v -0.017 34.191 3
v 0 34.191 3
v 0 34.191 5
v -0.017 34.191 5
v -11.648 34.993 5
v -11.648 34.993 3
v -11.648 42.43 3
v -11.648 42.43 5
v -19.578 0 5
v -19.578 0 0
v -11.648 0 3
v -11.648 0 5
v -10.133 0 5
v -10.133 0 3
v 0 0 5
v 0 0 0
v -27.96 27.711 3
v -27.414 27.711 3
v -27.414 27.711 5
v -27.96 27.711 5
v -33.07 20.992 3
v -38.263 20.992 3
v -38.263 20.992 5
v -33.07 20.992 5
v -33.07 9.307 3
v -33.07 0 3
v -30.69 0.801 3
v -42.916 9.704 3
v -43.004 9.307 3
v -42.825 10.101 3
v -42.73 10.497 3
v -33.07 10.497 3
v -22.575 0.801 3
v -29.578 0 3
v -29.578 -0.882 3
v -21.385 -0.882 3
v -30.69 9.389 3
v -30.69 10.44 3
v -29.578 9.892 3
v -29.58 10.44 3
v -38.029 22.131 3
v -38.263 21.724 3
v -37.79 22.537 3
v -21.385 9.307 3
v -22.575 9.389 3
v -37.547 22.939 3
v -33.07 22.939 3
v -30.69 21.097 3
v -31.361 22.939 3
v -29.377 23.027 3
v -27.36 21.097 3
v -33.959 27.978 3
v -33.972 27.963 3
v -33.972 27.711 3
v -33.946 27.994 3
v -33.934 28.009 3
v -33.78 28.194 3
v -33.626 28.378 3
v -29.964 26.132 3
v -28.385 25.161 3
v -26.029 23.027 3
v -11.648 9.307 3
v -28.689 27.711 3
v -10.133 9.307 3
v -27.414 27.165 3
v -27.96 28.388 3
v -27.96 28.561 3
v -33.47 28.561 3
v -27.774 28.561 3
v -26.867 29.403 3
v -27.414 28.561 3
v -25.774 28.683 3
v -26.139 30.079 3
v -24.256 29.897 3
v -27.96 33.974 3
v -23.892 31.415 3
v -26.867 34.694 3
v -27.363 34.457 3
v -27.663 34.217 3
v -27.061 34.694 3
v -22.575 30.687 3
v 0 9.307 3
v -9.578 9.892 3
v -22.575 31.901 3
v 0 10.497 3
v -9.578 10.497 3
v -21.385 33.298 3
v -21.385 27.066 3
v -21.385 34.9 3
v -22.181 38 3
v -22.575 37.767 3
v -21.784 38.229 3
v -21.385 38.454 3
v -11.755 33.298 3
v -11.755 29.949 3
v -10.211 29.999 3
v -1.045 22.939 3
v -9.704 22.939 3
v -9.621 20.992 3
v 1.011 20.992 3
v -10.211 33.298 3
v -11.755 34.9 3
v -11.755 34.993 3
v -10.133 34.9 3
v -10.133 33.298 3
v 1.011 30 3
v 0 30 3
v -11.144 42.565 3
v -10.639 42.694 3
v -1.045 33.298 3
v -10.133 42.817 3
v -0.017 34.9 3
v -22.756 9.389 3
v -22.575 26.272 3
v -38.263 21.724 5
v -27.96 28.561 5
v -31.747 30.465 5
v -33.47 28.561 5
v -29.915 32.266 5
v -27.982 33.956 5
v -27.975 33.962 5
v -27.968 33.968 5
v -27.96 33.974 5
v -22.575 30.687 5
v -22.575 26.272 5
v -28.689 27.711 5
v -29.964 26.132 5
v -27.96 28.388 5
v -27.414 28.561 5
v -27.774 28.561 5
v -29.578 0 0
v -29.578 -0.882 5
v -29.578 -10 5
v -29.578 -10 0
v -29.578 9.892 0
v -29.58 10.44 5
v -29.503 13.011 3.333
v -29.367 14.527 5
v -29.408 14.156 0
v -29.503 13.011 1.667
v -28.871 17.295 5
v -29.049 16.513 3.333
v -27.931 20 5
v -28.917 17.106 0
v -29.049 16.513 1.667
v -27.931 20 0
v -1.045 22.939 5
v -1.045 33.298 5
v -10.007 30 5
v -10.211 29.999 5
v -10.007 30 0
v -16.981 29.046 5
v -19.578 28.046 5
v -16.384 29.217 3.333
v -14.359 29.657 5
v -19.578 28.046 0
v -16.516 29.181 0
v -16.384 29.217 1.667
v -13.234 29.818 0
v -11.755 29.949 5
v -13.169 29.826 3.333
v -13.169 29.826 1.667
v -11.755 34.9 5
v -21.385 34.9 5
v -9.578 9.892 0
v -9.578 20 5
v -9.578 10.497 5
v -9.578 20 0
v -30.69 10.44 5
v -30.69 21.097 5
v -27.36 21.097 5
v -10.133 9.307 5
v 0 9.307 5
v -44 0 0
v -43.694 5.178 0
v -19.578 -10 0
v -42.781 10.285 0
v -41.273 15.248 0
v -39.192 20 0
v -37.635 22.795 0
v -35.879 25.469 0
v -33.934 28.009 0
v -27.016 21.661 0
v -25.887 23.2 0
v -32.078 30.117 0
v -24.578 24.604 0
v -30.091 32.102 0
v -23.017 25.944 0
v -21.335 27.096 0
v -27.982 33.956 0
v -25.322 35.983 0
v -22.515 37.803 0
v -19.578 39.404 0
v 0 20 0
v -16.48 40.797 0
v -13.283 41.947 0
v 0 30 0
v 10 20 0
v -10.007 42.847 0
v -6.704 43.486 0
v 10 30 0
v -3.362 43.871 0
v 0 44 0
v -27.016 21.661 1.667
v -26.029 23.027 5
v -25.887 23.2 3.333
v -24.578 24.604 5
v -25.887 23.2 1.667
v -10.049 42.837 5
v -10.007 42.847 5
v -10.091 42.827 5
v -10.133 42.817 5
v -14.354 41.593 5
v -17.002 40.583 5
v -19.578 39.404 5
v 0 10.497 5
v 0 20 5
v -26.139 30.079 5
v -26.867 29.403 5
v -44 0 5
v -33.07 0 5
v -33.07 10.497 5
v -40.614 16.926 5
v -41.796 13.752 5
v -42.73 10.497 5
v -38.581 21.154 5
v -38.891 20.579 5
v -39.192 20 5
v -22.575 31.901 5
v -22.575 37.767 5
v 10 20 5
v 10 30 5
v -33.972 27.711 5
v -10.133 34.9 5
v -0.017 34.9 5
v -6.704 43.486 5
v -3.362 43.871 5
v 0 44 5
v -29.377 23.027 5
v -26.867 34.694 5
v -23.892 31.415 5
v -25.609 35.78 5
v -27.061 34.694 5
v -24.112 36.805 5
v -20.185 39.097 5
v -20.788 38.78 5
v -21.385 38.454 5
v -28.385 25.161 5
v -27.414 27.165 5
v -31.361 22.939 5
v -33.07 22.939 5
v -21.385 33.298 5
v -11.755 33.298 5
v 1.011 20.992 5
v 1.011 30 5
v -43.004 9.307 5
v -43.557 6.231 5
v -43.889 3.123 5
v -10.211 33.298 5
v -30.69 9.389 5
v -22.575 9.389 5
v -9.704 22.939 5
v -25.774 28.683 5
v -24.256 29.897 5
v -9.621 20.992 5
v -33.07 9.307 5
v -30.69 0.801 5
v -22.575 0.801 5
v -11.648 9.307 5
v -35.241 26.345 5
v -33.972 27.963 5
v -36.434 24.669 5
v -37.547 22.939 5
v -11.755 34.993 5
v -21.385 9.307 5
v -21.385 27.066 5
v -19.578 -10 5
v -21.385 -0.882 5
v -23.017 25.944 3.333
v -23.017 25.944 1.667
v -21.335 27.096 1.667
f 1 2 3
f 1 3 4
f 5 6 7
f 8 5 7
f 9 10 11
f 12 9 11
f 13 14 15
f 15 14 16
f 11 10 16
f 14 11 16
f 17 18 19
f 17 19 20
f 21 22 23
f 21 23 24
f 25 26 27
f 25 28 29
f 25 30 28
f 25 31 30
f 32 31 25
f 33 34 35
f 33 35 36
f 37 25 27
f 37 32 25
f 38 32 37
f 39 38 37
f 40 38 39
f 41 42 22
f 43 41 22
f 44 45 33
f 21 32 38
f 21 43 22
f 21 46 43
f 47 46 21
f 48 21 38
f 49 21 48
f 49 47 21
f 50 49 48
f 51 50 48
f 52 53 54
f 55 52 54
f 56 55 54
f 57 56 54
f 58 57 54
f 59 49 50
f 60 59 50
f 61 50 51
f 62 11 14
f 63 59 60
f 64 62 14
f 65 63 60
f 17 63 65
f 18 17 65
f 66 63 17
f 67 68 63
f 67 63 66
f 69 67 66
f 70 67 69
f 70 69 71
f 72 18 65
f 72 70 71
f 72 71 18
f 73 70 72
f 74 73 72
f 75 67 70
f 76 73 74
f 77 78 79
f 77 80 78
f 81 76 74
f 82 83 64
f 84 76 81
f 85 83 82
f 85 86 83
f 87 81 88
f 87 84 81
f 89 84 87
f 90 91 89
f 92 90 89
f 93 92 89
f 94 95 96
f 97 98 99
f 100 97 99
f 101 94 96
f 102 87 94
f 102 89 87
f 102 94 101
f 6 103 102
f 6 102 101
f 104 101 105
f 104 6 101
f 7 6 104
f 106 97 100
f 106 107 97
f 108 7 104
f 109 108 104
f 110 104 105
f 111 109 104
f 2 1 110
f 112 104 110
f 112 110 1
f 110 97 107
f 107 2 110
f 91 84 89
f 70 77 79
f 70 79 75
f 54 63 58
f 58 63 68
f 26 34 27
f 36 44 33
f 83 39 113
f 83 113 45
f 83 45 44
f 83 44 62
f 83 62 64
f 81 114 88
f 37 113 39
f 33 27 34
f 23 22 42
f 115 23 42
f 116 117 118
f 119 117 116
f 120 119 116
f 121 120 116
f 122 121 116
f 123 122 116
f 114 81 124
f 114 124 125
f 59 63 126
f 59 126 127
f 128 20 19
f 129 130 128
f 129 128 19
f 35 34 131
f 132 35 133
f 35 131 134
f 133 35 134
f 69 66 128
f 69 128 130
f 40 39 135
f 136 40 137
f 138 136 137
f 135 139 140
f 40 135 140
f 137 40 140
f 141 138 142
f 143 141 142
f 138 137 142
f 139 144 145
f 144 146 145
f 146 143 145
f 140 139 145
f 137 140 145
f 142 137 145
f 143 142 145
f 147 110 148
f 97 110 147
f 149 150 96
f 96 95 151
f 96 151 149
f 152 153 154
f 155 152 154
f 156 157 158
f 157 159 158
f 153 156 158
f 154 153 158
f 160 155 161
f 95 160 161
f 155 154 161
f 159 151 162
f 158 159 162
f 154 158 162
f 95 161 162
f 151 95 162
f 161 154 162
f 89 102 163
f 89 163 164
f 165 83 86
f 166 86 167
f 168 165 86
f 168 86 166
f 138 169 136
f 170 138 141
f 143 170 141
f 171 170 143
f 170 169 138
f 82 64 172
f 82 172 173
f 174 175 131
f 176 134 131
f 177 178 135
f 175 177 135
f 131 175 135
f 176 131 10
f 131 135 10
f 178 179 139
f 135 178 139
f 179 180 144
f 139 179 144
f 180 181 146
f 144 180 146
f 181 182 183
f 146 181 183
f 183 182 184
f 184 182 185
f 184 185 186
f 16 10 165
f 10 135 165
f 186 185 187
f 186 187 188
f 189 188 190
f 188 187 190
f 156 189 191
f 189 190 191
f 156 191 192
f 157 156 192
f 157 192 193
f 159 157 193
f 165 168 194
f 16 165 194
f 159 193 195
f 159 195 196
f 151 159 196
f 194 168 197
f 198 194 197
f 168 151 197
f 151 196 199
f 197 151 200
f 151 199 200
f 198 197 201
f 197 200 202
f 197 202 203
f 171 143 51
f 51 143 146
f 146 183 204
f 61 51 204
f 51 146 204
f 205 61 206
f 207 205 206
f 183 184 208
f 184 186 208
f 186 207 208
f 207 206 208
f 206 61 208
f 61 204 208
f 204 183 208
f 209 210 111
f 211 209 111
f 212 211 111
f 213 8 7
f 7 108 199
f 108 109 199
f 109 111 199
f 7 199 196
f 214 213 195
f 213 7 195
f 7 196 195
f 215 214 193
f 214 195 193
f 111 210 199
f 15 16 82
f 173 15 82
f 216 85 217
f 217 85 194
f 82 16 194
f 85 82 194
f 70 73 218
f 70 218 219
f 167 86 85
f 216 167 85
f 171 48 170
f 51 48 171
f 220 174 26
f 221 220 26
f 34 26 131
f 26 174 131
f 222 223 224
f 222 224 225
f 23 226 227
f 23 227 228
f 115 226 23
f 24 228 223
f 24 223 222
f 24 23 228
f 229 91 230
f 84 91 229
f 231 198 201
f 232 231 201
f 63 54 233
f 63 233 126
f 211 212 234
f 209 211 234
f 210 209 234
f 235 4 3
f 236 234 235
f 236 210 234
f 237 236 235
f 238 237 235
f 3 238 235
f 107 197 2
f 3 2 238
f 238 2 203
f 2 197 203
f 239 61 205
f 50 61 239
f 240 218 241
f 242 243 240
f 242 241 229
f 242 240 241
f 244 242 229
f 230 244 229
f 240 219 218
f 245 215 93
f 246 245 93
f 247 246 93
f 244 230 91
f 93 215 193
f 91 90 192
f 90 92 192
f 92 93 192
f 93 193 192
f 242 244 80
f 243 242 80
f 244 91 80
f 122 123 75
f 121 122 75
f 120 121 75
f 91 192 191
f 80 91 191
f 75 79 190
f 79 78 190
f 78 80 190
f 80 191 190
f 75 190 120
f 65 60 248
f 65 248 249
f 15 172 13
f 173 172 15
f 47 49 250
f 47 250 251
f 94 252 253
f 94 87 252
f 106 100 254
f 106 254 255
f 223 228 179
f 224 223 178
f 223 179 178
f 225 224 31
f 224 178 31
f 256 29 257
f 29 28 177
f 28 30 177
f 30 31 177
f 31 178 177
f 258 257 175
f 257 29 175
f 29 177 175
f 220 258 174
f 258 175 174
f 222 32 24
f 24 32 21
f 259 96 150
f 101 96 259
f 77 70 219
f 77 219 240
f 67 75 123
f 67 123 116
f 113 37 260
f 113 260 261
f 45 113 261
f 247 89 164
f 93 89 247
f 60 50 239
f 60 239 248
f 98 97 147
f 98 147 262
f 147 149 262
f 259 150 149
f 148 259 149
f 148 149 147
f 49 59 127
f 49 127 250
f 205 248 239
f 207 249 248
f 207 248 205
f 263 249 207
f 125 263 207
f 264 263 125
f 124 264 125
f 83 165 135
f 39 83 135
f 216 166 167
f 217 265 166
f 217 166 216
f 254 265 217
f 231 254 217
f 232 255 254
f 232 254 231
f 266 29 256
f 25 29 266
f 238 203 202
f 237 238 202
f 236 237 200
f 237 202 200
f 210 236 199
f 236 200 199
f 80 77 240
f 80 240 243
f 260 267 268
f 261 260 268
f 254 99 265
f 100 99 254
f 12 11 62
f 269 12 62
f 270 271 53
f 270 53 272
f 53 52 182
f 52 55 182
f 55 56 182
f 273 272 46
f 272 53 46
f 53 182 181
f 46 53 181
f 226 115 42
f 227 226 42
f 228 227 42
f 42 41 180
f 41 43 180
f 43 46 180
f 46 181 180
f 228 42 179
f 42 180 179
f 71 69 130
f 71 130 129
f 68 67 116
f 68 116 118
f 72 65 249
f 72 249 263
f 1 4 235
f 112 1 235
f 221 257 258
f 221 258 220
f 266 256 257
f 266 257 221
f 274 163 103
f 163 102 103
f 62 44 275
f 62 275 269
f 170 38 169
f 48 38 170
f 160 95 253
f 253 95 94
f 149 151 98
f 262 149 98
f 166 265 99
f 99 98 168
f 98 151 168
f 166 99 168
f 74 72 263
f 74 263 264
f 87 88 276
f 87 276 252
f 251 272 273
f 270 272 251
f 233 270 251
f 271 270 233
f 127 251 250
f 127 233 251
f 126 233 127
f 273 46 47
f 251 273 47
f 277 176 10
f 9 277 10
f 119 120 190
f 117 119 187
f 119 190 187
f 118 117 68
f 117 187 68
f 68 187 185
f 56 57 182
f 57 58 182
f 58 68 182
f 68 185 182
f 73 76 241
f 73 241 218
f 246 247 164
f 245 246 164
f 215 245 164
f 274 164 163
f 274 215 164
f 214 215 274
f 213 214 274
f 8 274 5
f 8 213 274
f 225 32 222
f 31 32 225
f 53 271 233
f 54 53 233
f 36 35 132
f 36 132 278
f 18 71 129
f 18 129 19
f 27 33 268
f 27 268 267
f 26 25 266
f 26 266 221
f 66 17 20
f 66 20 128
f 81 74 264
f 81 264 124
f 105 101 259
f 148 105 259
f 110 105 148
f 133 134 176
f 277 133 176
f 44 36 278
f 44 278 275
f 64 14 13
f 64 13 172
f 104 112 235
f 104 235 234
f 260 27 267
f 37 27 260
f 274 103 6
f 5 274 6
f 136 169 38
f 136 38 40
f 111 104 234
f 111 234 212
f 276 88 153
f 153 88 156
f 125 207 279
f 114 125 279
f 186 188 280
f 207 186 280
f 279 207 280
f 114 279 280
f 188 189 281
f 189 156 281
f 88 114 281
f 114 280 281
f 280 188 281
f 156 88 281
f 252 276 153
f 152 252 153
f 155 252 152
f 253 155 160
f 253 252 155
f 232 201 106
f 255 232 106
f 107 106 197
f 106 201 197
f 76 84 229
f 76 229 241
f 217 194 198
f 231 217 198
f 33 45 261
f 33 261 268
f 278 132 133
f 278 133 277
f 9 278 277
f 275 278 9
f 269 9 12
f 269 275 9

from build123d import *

# Parameters (mm, degrees)
F1_W     = 9.5782261753
F1_H     = 9.891791337
F1_H_2   = 10.108208663
F1_W_2   = 10
F1_H_3   = 10
F2_DEPTH = 5
F3_W     = 10.1701691747
F3_H     = 1.1901259422
F3_W_2   = 2.3802500218
F3_W_3   = 1.1901250109
F3_H_2   = 0.8006438729
F3_H_3   = 10.4947462678
F3_W_4   = 5.1932781935
F3_H_4   = 1.9474774599
F3_W_5   = 1.1901259422
F3_H_5   = 8.5062488797
F3_W_6   = 9.7373928875
F3_W_7   = 1.514704898
F3_H_6   = 9.3068927526
F3_W_8   = 10.1330708712
F3_H_7   = 1.6025230289
F3_W_9   = 9.0882331133
F3_H_8   = 3.835350275
F3_W_10  = 1.0448377579
F3_H_9   = 8.595854044
F3_W_11  = 1.0108357528
F3_W_12  = 1.0278367554
F3_H_10  = 0.8937604725
F4_DEPTH = 25
F5_W     = 8.1058442593
F5_H     = 1.9299630076
F5_W_2   = 1.5439689159
F5_W_3   = 1.5439717099
F5_H_2   = 11.9657684118
F5_W_4   = 10.3005599231
F5_H_3   = 1.0513318703
F6_DEPTH = 25


# Not quite as in the source:
# - a feature names something its author has since deleted; it is built from what else it names


with BuildPart() as f2:
    # F1 (on Top) → F2 (new body)
    with BuildSketch(Plane.XY):
        with Locations((-4.7891130877, 4.9458956685)):
            Rectangle(F1_W, F1_H)
        Polygon((-10, 0), (-9.5782261753, 0), (-9.5782261753, 9.891791337), (-19.5782261753, 9.891791337), (-19.5782261753, 0), align=None)
        with Locations((-4.7891130877, 14.9458956685)):
            Rectangle(F1_W, F1_H_2)
        Polygon((0, 30), (0, 20), (0.4217738247, 20), (10, 20), (10, 30), align=None)
        Polygon((-9.5782261753, 20), (0, 20), (0, 30), (-10.0065707871, 30), align=None)
        with Locations((-24.5782261753, 4.9458956685)):
            Rectangle(F1_W_2, F1_H)
        with Locations((-24.5782261753, -5)):
            Rectangle(F1_W_2, F1_H_3)
        with BuildLine():
            Line((-10.0065707871, 30), (0, 30))
            Line((0, 30), (0, 44))
            ThreePointArc((0, 44), (-5.0363871882, 43.7108087787), (-10.0065707871, 42.8470365496))
            Line((-10.0065707871, 42.8470365496), (-10.0065707871, 30))
        make_face()
        with BuildLine():
            Line((-44, 0), (-29.5782261753, 0))
            Line((-29.5782261753, 0), (-29.5782261753, 9.891791337))
            add(Edge.make_bspline(
                [(-29.5782261753, 9.891791337), (-29.5956822452, 12.6865898133), (-29.4779762378, 16.6539770733), (-27.9306023487, 20)],
                knots=[0, 0, 0, 0, 0.3288616787, 0.3288616787, 0.3288616787, 0.3288616787], degree=3))
            Line((-27.9306023487, 20), (-39.1918358845, 20))
            ThreePointArc((-39.1918358845, 20), (-42.7810751321, 10.2849215136), (-44, 0))
        make_face()
        with BuildLine():
            add(Edge.make_bspline(
                [(-19.5782261753, 28.0459611928), (-16.4208018887, 29.540455447), (-13.1162348053, 30), (-10.0065707871, 30)],
                knots=[0.678814496, 0.678814496, 0.678814496, 0.678814496, 1, 1, 1, 1], degree=3))
            Line((-10.0065707871, 30), (-10.0065707871, 42.8470365496))
            ThreePointArc((-10.0065707871, 42.8470365496), (-14.8922224071, 41.4031606496), (-19.5782261753, 39.4042264209))
            Line((-19.5782261753, 39.4042264209), (-19.5782261753, 28.0459611928))
        make_face()
        with BuildLine():
            add(Edge.make_bspline(
                [(-24.5782261753, 24.6040217078), (-23.0917294817, 26.0318138691), (-21.358363516, 27.2033740757), (-19.5782261753, 28.0459611928)],
                knots=[0.497731988, 0.497731988, 0.497731988, 0.497731988, 0.678814496, 0.678814496, 0.678814496, 0.678814496], degree=3))
            Line((-19.5782261753, 28.0459611928), (-19.5782261753, 39.4042264209))
            ThreePointArc((-19.5782261753, 39.4042264209), (-23.9356591488, 36.9199704918), (-27.9820429197, 33.9559313529))
            Line((-27.9820429197, 33.9559313529), (-24.5782261753, 24.6040217078))
        make_face()
        with BuildLine():
            Line((-39.1918358845, 20), (-27.9306023487, 20))
            add(Edge.make_bspline(
                [(-27.9306023487, 20), (-27.136026622, 21.7181811177), (-25.9644735778, 23.2725198056), (-24.5782261753, 24.6040217078)],
                knots=[0.3288616787, 0.3288616787, 0.3288616787, 0.3288616787, 0.497731988, 0.497731988, 0.497731988, 0.497731988], degree=3))
            Line((-24.5782261753, 24.6040217078), (-33.9336129947, 28.00910404))
            ThreePointArc((-33.9336129947, 28.00910404), (-36.7813710365, 24.148100229), (-39.1918358845, 20))
        make_face()
        with BuildLine():
            Line((-33.9336129947, 28.00910404), (-24.5782261753, 24.6040217078))
            Line((-24.5782261753, 24.6040217078), (-27.9820429197, 33.9559313529))
            ThreePointArc((-27.9820429197, 33.9559313529), (-31.1002942205, 31.1250975806), (-33.9336129947, 28.00910404))
        make_face()
    extrude(amount=F2_DEPTH)

    # F3 (on offset) → F4 (cut)
    with BuildSketch(Plane.XY.offset(3)):
        Polygon((-33.0700390041, 9.3068927526), (-33.0700390041, 0), (-31.8799139932, 0), (-31.8799139932, 0.8006438729), (-30.6897889823, 0.8006438729), (-30.6897889823, 9.3068927526), align=None)
        with Locations((-38.1551235914, 9.9019557238)):
            Rectangle(F3_W, F3_H)
        with Locations((-31.8799139932, 9.9019557238)):
            Rectangle(F3_W_2, F3_H)
        with Locations((-31.2848514877, 0.4003219365)):
            Rectangle(F3_W_3, F3_H_2)
        Polygon((-30.6897889823, 0), (-31.8799139932, 0), (-31.8799139932, -0.8824482211), (-21.3851686567, -0.8824482211), (-21.3851686567, 0), (-22.5752945989, 0), (-22.5752945989, 0.8006438729), (-30.6897889823, 0.8006438729), align=None)
        with Locations((-31.8799139932, 15.7443918288)):
            Rectangle(F3_W_2, F3_H_3)
        with Locations((-35.6666781008, 21.9655036926)):
            Rectangle(F3_W_4, F3_H_4)
        Polygon((-33.0700390041, 22.9392424226), (-33.0700390041, 20.9917649627), (-30.6897889823, 20.9917649627), (-30.6897889823, 22.9392424226), (-31.3607603312, 22.9392424226), align=None)
        with Locations((-21.9802316278, 5.0537683128)):
            Rectangle(F3_W_5, F3_H_5)
        with Locations((-21.9802316278, 9.9019557238)):
            Rectangle(F3_W_5, F3_H)
        with Locations((-21.9802316278, 0.4003219365)):
            Rectangle(F3_W_5, F3_H_2)
        with Locations((-16.516472213, 9.9019557238)):
            Rectangle(F3_W_6, F3_H)
        Polygon((-29.9641676247, 26.1324569583), (-31.3607603312, 22.9392424226), (-30.6897889823, 22.9392424226), (-29.4176749885, 22.9392424226), (-28.3854100853, 25.160914287), (-27.413867414, 27.1647218615), (-25.7743895054, 28.682757169), (-24.2563541979, 29.8971850425), (-22.5752945989, 30.6865628809), (-22.5752945989, 31.9009907544), (-23.8920263946, 31.41522035), (-26.1387173086, 30.0793480128), (-26.8673747778, 29.40273819), (-26.8673747778, 27.7112144977), (-27.413867414, 27.7112144977), (-27.9603600502, 27.7112144977), (-28.6890175194, 27.7112144977), align=None)
        with Locations((-10.8904233202, 4.6534463763)):
            Rectangle(F3_W_7, F3_H_6)
        with Locations((-10.8904233202, 9.9019557238)):
            Rectangle(F3_W_7, F3_H)
        Polygon((-22.5752945989, 30.6865628809), (-22.5752945989, 22.9392424226), (-21.3851686567, 22.9392424226), (-21.3851686567, 33.2975834608), (-22.5752945989, 33.2975834608), (-22.5752945989, 31.9009907544), align=None)
        with Locations((-10.8904233202, 15.7443918288)):
            Rectangle(F3_W_7, F3_H_3)
        with Locations((-5.0665354356, 9.9019557238)):
            Rectangle(F3_W_8, F3_H)
        Polygon((-27.9603600502, 28.3878243205), (-28.6890175194, 27.7112144977), (-27.9603600502, 27.7112144977), align=None)
        Polygon((-33.9717790484, 27.7112144977), (-28.6890175194, 27.7112144977), (-27.9603600502, 28.3878243205), (-27.9603600502, 28.5613127053), (-33.9717790484, 28.5613127053), align=None)
        with Locations((-10.8904233202, 21.9655036926)):
            Rectangle(F3_W_7, F3_H_4)
        Polygon((-27.9603600502, 28.5613127053), (-27.9603600502, 28.3878243205), (-27.7735262161, 28.5613127053), align=None)
        with Locations((-21.9802316278, 34.0988449752)):
            Rectangle(F3_W_5, F3_H_7)
        with Locations((-16.516472213, 34.0988449752)):
            Rectangle(F3_W_6, F3_H_7)
        with Locations((-5.5889543146, 21.9655036926)):
            Rectangle(F3_W_9, F3_H_4)
        Polygon((-27.413867414, 28.5613127053), (-27.413867414, 27.7112144977), (-26.8673747778, 27.7112144977), (-26.8673747778, 29.40273819), (-27.7735262161, 28.5613127053), align=None)
        Polygon((-27.9603600502, 34.6941761672), (-27.9603600502, 28.5613127053), (-27.7735262161, 28.5613127053), (-26.8673747778, 29.40273819), (-26.8673747778, 34.6941761672), align=None)
        with Locations((-21.9802316278, 36.8177816272)):
            Rectangle(F3_W_5, F3_H_8)
        with Locations((-10.8904233202, 34.0988449752)):
            Rectangle(F3_W_7, F3_H_7)
        with Locations((-0.522418879, 21.9655036926)):
            Rectangle(F3_W_10, F3_H_4)
        with Locations((-10.8904233202, 39.1980335116)):
            Rectangle(F3_W_7, F3_H_9)
        Polygon((-10.1330708712, 34.9001064897), (-10.1330708712, 33.2975834608), (-1.0448377579, 33.2975834608), (-1.0448377579, 34.1913439333), (-0.0170010026, 34.1913439333), (-0.0170010026, 34.9001064897), align=None)
        Polygon((-1.0448377579, 33.2975834608), (-1.0448377579, 22.9392424226), (0, 22.9392424226), (1.0108357528, 22.9392424226), (1.0108357528, 34.1913439333), (-0.0170010026, 34.1913439333), (-0.0170010026, 33.2975834608), align=None)
        with Locations((0.5054178764, 21.9655036926)):
            Rectangle(F3_W_11, F3_H_4)
        with Locations((-0.5309193803, 33.7444636971)):
            Rectangle(F3_W_12, F3_H_10)
    extrude(amount=F4_DEPTH, mode=Mode.SUBTRACT)

    # F5 (on offset) → F6 (cut)
    with BuildSketch(Plane.XY.offset(3)):
        with Locations((-26.8084984273, 22.0622615889)):
            Rectangle(F5_W, F5_H)
        with Locations((-21.9835918397, 22.0622615889)):
            Rectangle(F5_W_2, F5_H)
        Polygon((-11.7547893897, 23.0272430927), (-21.2116073817, 23.0272430927), (-21.2116073817, 21.0972800851), (-10.2108176798, 21.0972800851), (-10.2108176798, 23.0272430927), align=None)
        Polygon((-21.2116073817, 21.0972800851), (-22.7555762976, 21.0972800851), (-22.7555762976, 10.4401707649), (-22.7555762976, 9.3888388947), (-21.2116073817, 9.3888388947), align=None)
        with Locations((-10.9828035347, 29.0101272985)):
            Rectangle(F5_W_3, F5_H_2)
        with Locations((-27.9058562592, 9.9145048298)):
            Rectangle(F5_W_4, F5_H_3)
    extrude(amount=F6_DEPTH, mode=Mode.SUBTRACT)


solid = f2.part
